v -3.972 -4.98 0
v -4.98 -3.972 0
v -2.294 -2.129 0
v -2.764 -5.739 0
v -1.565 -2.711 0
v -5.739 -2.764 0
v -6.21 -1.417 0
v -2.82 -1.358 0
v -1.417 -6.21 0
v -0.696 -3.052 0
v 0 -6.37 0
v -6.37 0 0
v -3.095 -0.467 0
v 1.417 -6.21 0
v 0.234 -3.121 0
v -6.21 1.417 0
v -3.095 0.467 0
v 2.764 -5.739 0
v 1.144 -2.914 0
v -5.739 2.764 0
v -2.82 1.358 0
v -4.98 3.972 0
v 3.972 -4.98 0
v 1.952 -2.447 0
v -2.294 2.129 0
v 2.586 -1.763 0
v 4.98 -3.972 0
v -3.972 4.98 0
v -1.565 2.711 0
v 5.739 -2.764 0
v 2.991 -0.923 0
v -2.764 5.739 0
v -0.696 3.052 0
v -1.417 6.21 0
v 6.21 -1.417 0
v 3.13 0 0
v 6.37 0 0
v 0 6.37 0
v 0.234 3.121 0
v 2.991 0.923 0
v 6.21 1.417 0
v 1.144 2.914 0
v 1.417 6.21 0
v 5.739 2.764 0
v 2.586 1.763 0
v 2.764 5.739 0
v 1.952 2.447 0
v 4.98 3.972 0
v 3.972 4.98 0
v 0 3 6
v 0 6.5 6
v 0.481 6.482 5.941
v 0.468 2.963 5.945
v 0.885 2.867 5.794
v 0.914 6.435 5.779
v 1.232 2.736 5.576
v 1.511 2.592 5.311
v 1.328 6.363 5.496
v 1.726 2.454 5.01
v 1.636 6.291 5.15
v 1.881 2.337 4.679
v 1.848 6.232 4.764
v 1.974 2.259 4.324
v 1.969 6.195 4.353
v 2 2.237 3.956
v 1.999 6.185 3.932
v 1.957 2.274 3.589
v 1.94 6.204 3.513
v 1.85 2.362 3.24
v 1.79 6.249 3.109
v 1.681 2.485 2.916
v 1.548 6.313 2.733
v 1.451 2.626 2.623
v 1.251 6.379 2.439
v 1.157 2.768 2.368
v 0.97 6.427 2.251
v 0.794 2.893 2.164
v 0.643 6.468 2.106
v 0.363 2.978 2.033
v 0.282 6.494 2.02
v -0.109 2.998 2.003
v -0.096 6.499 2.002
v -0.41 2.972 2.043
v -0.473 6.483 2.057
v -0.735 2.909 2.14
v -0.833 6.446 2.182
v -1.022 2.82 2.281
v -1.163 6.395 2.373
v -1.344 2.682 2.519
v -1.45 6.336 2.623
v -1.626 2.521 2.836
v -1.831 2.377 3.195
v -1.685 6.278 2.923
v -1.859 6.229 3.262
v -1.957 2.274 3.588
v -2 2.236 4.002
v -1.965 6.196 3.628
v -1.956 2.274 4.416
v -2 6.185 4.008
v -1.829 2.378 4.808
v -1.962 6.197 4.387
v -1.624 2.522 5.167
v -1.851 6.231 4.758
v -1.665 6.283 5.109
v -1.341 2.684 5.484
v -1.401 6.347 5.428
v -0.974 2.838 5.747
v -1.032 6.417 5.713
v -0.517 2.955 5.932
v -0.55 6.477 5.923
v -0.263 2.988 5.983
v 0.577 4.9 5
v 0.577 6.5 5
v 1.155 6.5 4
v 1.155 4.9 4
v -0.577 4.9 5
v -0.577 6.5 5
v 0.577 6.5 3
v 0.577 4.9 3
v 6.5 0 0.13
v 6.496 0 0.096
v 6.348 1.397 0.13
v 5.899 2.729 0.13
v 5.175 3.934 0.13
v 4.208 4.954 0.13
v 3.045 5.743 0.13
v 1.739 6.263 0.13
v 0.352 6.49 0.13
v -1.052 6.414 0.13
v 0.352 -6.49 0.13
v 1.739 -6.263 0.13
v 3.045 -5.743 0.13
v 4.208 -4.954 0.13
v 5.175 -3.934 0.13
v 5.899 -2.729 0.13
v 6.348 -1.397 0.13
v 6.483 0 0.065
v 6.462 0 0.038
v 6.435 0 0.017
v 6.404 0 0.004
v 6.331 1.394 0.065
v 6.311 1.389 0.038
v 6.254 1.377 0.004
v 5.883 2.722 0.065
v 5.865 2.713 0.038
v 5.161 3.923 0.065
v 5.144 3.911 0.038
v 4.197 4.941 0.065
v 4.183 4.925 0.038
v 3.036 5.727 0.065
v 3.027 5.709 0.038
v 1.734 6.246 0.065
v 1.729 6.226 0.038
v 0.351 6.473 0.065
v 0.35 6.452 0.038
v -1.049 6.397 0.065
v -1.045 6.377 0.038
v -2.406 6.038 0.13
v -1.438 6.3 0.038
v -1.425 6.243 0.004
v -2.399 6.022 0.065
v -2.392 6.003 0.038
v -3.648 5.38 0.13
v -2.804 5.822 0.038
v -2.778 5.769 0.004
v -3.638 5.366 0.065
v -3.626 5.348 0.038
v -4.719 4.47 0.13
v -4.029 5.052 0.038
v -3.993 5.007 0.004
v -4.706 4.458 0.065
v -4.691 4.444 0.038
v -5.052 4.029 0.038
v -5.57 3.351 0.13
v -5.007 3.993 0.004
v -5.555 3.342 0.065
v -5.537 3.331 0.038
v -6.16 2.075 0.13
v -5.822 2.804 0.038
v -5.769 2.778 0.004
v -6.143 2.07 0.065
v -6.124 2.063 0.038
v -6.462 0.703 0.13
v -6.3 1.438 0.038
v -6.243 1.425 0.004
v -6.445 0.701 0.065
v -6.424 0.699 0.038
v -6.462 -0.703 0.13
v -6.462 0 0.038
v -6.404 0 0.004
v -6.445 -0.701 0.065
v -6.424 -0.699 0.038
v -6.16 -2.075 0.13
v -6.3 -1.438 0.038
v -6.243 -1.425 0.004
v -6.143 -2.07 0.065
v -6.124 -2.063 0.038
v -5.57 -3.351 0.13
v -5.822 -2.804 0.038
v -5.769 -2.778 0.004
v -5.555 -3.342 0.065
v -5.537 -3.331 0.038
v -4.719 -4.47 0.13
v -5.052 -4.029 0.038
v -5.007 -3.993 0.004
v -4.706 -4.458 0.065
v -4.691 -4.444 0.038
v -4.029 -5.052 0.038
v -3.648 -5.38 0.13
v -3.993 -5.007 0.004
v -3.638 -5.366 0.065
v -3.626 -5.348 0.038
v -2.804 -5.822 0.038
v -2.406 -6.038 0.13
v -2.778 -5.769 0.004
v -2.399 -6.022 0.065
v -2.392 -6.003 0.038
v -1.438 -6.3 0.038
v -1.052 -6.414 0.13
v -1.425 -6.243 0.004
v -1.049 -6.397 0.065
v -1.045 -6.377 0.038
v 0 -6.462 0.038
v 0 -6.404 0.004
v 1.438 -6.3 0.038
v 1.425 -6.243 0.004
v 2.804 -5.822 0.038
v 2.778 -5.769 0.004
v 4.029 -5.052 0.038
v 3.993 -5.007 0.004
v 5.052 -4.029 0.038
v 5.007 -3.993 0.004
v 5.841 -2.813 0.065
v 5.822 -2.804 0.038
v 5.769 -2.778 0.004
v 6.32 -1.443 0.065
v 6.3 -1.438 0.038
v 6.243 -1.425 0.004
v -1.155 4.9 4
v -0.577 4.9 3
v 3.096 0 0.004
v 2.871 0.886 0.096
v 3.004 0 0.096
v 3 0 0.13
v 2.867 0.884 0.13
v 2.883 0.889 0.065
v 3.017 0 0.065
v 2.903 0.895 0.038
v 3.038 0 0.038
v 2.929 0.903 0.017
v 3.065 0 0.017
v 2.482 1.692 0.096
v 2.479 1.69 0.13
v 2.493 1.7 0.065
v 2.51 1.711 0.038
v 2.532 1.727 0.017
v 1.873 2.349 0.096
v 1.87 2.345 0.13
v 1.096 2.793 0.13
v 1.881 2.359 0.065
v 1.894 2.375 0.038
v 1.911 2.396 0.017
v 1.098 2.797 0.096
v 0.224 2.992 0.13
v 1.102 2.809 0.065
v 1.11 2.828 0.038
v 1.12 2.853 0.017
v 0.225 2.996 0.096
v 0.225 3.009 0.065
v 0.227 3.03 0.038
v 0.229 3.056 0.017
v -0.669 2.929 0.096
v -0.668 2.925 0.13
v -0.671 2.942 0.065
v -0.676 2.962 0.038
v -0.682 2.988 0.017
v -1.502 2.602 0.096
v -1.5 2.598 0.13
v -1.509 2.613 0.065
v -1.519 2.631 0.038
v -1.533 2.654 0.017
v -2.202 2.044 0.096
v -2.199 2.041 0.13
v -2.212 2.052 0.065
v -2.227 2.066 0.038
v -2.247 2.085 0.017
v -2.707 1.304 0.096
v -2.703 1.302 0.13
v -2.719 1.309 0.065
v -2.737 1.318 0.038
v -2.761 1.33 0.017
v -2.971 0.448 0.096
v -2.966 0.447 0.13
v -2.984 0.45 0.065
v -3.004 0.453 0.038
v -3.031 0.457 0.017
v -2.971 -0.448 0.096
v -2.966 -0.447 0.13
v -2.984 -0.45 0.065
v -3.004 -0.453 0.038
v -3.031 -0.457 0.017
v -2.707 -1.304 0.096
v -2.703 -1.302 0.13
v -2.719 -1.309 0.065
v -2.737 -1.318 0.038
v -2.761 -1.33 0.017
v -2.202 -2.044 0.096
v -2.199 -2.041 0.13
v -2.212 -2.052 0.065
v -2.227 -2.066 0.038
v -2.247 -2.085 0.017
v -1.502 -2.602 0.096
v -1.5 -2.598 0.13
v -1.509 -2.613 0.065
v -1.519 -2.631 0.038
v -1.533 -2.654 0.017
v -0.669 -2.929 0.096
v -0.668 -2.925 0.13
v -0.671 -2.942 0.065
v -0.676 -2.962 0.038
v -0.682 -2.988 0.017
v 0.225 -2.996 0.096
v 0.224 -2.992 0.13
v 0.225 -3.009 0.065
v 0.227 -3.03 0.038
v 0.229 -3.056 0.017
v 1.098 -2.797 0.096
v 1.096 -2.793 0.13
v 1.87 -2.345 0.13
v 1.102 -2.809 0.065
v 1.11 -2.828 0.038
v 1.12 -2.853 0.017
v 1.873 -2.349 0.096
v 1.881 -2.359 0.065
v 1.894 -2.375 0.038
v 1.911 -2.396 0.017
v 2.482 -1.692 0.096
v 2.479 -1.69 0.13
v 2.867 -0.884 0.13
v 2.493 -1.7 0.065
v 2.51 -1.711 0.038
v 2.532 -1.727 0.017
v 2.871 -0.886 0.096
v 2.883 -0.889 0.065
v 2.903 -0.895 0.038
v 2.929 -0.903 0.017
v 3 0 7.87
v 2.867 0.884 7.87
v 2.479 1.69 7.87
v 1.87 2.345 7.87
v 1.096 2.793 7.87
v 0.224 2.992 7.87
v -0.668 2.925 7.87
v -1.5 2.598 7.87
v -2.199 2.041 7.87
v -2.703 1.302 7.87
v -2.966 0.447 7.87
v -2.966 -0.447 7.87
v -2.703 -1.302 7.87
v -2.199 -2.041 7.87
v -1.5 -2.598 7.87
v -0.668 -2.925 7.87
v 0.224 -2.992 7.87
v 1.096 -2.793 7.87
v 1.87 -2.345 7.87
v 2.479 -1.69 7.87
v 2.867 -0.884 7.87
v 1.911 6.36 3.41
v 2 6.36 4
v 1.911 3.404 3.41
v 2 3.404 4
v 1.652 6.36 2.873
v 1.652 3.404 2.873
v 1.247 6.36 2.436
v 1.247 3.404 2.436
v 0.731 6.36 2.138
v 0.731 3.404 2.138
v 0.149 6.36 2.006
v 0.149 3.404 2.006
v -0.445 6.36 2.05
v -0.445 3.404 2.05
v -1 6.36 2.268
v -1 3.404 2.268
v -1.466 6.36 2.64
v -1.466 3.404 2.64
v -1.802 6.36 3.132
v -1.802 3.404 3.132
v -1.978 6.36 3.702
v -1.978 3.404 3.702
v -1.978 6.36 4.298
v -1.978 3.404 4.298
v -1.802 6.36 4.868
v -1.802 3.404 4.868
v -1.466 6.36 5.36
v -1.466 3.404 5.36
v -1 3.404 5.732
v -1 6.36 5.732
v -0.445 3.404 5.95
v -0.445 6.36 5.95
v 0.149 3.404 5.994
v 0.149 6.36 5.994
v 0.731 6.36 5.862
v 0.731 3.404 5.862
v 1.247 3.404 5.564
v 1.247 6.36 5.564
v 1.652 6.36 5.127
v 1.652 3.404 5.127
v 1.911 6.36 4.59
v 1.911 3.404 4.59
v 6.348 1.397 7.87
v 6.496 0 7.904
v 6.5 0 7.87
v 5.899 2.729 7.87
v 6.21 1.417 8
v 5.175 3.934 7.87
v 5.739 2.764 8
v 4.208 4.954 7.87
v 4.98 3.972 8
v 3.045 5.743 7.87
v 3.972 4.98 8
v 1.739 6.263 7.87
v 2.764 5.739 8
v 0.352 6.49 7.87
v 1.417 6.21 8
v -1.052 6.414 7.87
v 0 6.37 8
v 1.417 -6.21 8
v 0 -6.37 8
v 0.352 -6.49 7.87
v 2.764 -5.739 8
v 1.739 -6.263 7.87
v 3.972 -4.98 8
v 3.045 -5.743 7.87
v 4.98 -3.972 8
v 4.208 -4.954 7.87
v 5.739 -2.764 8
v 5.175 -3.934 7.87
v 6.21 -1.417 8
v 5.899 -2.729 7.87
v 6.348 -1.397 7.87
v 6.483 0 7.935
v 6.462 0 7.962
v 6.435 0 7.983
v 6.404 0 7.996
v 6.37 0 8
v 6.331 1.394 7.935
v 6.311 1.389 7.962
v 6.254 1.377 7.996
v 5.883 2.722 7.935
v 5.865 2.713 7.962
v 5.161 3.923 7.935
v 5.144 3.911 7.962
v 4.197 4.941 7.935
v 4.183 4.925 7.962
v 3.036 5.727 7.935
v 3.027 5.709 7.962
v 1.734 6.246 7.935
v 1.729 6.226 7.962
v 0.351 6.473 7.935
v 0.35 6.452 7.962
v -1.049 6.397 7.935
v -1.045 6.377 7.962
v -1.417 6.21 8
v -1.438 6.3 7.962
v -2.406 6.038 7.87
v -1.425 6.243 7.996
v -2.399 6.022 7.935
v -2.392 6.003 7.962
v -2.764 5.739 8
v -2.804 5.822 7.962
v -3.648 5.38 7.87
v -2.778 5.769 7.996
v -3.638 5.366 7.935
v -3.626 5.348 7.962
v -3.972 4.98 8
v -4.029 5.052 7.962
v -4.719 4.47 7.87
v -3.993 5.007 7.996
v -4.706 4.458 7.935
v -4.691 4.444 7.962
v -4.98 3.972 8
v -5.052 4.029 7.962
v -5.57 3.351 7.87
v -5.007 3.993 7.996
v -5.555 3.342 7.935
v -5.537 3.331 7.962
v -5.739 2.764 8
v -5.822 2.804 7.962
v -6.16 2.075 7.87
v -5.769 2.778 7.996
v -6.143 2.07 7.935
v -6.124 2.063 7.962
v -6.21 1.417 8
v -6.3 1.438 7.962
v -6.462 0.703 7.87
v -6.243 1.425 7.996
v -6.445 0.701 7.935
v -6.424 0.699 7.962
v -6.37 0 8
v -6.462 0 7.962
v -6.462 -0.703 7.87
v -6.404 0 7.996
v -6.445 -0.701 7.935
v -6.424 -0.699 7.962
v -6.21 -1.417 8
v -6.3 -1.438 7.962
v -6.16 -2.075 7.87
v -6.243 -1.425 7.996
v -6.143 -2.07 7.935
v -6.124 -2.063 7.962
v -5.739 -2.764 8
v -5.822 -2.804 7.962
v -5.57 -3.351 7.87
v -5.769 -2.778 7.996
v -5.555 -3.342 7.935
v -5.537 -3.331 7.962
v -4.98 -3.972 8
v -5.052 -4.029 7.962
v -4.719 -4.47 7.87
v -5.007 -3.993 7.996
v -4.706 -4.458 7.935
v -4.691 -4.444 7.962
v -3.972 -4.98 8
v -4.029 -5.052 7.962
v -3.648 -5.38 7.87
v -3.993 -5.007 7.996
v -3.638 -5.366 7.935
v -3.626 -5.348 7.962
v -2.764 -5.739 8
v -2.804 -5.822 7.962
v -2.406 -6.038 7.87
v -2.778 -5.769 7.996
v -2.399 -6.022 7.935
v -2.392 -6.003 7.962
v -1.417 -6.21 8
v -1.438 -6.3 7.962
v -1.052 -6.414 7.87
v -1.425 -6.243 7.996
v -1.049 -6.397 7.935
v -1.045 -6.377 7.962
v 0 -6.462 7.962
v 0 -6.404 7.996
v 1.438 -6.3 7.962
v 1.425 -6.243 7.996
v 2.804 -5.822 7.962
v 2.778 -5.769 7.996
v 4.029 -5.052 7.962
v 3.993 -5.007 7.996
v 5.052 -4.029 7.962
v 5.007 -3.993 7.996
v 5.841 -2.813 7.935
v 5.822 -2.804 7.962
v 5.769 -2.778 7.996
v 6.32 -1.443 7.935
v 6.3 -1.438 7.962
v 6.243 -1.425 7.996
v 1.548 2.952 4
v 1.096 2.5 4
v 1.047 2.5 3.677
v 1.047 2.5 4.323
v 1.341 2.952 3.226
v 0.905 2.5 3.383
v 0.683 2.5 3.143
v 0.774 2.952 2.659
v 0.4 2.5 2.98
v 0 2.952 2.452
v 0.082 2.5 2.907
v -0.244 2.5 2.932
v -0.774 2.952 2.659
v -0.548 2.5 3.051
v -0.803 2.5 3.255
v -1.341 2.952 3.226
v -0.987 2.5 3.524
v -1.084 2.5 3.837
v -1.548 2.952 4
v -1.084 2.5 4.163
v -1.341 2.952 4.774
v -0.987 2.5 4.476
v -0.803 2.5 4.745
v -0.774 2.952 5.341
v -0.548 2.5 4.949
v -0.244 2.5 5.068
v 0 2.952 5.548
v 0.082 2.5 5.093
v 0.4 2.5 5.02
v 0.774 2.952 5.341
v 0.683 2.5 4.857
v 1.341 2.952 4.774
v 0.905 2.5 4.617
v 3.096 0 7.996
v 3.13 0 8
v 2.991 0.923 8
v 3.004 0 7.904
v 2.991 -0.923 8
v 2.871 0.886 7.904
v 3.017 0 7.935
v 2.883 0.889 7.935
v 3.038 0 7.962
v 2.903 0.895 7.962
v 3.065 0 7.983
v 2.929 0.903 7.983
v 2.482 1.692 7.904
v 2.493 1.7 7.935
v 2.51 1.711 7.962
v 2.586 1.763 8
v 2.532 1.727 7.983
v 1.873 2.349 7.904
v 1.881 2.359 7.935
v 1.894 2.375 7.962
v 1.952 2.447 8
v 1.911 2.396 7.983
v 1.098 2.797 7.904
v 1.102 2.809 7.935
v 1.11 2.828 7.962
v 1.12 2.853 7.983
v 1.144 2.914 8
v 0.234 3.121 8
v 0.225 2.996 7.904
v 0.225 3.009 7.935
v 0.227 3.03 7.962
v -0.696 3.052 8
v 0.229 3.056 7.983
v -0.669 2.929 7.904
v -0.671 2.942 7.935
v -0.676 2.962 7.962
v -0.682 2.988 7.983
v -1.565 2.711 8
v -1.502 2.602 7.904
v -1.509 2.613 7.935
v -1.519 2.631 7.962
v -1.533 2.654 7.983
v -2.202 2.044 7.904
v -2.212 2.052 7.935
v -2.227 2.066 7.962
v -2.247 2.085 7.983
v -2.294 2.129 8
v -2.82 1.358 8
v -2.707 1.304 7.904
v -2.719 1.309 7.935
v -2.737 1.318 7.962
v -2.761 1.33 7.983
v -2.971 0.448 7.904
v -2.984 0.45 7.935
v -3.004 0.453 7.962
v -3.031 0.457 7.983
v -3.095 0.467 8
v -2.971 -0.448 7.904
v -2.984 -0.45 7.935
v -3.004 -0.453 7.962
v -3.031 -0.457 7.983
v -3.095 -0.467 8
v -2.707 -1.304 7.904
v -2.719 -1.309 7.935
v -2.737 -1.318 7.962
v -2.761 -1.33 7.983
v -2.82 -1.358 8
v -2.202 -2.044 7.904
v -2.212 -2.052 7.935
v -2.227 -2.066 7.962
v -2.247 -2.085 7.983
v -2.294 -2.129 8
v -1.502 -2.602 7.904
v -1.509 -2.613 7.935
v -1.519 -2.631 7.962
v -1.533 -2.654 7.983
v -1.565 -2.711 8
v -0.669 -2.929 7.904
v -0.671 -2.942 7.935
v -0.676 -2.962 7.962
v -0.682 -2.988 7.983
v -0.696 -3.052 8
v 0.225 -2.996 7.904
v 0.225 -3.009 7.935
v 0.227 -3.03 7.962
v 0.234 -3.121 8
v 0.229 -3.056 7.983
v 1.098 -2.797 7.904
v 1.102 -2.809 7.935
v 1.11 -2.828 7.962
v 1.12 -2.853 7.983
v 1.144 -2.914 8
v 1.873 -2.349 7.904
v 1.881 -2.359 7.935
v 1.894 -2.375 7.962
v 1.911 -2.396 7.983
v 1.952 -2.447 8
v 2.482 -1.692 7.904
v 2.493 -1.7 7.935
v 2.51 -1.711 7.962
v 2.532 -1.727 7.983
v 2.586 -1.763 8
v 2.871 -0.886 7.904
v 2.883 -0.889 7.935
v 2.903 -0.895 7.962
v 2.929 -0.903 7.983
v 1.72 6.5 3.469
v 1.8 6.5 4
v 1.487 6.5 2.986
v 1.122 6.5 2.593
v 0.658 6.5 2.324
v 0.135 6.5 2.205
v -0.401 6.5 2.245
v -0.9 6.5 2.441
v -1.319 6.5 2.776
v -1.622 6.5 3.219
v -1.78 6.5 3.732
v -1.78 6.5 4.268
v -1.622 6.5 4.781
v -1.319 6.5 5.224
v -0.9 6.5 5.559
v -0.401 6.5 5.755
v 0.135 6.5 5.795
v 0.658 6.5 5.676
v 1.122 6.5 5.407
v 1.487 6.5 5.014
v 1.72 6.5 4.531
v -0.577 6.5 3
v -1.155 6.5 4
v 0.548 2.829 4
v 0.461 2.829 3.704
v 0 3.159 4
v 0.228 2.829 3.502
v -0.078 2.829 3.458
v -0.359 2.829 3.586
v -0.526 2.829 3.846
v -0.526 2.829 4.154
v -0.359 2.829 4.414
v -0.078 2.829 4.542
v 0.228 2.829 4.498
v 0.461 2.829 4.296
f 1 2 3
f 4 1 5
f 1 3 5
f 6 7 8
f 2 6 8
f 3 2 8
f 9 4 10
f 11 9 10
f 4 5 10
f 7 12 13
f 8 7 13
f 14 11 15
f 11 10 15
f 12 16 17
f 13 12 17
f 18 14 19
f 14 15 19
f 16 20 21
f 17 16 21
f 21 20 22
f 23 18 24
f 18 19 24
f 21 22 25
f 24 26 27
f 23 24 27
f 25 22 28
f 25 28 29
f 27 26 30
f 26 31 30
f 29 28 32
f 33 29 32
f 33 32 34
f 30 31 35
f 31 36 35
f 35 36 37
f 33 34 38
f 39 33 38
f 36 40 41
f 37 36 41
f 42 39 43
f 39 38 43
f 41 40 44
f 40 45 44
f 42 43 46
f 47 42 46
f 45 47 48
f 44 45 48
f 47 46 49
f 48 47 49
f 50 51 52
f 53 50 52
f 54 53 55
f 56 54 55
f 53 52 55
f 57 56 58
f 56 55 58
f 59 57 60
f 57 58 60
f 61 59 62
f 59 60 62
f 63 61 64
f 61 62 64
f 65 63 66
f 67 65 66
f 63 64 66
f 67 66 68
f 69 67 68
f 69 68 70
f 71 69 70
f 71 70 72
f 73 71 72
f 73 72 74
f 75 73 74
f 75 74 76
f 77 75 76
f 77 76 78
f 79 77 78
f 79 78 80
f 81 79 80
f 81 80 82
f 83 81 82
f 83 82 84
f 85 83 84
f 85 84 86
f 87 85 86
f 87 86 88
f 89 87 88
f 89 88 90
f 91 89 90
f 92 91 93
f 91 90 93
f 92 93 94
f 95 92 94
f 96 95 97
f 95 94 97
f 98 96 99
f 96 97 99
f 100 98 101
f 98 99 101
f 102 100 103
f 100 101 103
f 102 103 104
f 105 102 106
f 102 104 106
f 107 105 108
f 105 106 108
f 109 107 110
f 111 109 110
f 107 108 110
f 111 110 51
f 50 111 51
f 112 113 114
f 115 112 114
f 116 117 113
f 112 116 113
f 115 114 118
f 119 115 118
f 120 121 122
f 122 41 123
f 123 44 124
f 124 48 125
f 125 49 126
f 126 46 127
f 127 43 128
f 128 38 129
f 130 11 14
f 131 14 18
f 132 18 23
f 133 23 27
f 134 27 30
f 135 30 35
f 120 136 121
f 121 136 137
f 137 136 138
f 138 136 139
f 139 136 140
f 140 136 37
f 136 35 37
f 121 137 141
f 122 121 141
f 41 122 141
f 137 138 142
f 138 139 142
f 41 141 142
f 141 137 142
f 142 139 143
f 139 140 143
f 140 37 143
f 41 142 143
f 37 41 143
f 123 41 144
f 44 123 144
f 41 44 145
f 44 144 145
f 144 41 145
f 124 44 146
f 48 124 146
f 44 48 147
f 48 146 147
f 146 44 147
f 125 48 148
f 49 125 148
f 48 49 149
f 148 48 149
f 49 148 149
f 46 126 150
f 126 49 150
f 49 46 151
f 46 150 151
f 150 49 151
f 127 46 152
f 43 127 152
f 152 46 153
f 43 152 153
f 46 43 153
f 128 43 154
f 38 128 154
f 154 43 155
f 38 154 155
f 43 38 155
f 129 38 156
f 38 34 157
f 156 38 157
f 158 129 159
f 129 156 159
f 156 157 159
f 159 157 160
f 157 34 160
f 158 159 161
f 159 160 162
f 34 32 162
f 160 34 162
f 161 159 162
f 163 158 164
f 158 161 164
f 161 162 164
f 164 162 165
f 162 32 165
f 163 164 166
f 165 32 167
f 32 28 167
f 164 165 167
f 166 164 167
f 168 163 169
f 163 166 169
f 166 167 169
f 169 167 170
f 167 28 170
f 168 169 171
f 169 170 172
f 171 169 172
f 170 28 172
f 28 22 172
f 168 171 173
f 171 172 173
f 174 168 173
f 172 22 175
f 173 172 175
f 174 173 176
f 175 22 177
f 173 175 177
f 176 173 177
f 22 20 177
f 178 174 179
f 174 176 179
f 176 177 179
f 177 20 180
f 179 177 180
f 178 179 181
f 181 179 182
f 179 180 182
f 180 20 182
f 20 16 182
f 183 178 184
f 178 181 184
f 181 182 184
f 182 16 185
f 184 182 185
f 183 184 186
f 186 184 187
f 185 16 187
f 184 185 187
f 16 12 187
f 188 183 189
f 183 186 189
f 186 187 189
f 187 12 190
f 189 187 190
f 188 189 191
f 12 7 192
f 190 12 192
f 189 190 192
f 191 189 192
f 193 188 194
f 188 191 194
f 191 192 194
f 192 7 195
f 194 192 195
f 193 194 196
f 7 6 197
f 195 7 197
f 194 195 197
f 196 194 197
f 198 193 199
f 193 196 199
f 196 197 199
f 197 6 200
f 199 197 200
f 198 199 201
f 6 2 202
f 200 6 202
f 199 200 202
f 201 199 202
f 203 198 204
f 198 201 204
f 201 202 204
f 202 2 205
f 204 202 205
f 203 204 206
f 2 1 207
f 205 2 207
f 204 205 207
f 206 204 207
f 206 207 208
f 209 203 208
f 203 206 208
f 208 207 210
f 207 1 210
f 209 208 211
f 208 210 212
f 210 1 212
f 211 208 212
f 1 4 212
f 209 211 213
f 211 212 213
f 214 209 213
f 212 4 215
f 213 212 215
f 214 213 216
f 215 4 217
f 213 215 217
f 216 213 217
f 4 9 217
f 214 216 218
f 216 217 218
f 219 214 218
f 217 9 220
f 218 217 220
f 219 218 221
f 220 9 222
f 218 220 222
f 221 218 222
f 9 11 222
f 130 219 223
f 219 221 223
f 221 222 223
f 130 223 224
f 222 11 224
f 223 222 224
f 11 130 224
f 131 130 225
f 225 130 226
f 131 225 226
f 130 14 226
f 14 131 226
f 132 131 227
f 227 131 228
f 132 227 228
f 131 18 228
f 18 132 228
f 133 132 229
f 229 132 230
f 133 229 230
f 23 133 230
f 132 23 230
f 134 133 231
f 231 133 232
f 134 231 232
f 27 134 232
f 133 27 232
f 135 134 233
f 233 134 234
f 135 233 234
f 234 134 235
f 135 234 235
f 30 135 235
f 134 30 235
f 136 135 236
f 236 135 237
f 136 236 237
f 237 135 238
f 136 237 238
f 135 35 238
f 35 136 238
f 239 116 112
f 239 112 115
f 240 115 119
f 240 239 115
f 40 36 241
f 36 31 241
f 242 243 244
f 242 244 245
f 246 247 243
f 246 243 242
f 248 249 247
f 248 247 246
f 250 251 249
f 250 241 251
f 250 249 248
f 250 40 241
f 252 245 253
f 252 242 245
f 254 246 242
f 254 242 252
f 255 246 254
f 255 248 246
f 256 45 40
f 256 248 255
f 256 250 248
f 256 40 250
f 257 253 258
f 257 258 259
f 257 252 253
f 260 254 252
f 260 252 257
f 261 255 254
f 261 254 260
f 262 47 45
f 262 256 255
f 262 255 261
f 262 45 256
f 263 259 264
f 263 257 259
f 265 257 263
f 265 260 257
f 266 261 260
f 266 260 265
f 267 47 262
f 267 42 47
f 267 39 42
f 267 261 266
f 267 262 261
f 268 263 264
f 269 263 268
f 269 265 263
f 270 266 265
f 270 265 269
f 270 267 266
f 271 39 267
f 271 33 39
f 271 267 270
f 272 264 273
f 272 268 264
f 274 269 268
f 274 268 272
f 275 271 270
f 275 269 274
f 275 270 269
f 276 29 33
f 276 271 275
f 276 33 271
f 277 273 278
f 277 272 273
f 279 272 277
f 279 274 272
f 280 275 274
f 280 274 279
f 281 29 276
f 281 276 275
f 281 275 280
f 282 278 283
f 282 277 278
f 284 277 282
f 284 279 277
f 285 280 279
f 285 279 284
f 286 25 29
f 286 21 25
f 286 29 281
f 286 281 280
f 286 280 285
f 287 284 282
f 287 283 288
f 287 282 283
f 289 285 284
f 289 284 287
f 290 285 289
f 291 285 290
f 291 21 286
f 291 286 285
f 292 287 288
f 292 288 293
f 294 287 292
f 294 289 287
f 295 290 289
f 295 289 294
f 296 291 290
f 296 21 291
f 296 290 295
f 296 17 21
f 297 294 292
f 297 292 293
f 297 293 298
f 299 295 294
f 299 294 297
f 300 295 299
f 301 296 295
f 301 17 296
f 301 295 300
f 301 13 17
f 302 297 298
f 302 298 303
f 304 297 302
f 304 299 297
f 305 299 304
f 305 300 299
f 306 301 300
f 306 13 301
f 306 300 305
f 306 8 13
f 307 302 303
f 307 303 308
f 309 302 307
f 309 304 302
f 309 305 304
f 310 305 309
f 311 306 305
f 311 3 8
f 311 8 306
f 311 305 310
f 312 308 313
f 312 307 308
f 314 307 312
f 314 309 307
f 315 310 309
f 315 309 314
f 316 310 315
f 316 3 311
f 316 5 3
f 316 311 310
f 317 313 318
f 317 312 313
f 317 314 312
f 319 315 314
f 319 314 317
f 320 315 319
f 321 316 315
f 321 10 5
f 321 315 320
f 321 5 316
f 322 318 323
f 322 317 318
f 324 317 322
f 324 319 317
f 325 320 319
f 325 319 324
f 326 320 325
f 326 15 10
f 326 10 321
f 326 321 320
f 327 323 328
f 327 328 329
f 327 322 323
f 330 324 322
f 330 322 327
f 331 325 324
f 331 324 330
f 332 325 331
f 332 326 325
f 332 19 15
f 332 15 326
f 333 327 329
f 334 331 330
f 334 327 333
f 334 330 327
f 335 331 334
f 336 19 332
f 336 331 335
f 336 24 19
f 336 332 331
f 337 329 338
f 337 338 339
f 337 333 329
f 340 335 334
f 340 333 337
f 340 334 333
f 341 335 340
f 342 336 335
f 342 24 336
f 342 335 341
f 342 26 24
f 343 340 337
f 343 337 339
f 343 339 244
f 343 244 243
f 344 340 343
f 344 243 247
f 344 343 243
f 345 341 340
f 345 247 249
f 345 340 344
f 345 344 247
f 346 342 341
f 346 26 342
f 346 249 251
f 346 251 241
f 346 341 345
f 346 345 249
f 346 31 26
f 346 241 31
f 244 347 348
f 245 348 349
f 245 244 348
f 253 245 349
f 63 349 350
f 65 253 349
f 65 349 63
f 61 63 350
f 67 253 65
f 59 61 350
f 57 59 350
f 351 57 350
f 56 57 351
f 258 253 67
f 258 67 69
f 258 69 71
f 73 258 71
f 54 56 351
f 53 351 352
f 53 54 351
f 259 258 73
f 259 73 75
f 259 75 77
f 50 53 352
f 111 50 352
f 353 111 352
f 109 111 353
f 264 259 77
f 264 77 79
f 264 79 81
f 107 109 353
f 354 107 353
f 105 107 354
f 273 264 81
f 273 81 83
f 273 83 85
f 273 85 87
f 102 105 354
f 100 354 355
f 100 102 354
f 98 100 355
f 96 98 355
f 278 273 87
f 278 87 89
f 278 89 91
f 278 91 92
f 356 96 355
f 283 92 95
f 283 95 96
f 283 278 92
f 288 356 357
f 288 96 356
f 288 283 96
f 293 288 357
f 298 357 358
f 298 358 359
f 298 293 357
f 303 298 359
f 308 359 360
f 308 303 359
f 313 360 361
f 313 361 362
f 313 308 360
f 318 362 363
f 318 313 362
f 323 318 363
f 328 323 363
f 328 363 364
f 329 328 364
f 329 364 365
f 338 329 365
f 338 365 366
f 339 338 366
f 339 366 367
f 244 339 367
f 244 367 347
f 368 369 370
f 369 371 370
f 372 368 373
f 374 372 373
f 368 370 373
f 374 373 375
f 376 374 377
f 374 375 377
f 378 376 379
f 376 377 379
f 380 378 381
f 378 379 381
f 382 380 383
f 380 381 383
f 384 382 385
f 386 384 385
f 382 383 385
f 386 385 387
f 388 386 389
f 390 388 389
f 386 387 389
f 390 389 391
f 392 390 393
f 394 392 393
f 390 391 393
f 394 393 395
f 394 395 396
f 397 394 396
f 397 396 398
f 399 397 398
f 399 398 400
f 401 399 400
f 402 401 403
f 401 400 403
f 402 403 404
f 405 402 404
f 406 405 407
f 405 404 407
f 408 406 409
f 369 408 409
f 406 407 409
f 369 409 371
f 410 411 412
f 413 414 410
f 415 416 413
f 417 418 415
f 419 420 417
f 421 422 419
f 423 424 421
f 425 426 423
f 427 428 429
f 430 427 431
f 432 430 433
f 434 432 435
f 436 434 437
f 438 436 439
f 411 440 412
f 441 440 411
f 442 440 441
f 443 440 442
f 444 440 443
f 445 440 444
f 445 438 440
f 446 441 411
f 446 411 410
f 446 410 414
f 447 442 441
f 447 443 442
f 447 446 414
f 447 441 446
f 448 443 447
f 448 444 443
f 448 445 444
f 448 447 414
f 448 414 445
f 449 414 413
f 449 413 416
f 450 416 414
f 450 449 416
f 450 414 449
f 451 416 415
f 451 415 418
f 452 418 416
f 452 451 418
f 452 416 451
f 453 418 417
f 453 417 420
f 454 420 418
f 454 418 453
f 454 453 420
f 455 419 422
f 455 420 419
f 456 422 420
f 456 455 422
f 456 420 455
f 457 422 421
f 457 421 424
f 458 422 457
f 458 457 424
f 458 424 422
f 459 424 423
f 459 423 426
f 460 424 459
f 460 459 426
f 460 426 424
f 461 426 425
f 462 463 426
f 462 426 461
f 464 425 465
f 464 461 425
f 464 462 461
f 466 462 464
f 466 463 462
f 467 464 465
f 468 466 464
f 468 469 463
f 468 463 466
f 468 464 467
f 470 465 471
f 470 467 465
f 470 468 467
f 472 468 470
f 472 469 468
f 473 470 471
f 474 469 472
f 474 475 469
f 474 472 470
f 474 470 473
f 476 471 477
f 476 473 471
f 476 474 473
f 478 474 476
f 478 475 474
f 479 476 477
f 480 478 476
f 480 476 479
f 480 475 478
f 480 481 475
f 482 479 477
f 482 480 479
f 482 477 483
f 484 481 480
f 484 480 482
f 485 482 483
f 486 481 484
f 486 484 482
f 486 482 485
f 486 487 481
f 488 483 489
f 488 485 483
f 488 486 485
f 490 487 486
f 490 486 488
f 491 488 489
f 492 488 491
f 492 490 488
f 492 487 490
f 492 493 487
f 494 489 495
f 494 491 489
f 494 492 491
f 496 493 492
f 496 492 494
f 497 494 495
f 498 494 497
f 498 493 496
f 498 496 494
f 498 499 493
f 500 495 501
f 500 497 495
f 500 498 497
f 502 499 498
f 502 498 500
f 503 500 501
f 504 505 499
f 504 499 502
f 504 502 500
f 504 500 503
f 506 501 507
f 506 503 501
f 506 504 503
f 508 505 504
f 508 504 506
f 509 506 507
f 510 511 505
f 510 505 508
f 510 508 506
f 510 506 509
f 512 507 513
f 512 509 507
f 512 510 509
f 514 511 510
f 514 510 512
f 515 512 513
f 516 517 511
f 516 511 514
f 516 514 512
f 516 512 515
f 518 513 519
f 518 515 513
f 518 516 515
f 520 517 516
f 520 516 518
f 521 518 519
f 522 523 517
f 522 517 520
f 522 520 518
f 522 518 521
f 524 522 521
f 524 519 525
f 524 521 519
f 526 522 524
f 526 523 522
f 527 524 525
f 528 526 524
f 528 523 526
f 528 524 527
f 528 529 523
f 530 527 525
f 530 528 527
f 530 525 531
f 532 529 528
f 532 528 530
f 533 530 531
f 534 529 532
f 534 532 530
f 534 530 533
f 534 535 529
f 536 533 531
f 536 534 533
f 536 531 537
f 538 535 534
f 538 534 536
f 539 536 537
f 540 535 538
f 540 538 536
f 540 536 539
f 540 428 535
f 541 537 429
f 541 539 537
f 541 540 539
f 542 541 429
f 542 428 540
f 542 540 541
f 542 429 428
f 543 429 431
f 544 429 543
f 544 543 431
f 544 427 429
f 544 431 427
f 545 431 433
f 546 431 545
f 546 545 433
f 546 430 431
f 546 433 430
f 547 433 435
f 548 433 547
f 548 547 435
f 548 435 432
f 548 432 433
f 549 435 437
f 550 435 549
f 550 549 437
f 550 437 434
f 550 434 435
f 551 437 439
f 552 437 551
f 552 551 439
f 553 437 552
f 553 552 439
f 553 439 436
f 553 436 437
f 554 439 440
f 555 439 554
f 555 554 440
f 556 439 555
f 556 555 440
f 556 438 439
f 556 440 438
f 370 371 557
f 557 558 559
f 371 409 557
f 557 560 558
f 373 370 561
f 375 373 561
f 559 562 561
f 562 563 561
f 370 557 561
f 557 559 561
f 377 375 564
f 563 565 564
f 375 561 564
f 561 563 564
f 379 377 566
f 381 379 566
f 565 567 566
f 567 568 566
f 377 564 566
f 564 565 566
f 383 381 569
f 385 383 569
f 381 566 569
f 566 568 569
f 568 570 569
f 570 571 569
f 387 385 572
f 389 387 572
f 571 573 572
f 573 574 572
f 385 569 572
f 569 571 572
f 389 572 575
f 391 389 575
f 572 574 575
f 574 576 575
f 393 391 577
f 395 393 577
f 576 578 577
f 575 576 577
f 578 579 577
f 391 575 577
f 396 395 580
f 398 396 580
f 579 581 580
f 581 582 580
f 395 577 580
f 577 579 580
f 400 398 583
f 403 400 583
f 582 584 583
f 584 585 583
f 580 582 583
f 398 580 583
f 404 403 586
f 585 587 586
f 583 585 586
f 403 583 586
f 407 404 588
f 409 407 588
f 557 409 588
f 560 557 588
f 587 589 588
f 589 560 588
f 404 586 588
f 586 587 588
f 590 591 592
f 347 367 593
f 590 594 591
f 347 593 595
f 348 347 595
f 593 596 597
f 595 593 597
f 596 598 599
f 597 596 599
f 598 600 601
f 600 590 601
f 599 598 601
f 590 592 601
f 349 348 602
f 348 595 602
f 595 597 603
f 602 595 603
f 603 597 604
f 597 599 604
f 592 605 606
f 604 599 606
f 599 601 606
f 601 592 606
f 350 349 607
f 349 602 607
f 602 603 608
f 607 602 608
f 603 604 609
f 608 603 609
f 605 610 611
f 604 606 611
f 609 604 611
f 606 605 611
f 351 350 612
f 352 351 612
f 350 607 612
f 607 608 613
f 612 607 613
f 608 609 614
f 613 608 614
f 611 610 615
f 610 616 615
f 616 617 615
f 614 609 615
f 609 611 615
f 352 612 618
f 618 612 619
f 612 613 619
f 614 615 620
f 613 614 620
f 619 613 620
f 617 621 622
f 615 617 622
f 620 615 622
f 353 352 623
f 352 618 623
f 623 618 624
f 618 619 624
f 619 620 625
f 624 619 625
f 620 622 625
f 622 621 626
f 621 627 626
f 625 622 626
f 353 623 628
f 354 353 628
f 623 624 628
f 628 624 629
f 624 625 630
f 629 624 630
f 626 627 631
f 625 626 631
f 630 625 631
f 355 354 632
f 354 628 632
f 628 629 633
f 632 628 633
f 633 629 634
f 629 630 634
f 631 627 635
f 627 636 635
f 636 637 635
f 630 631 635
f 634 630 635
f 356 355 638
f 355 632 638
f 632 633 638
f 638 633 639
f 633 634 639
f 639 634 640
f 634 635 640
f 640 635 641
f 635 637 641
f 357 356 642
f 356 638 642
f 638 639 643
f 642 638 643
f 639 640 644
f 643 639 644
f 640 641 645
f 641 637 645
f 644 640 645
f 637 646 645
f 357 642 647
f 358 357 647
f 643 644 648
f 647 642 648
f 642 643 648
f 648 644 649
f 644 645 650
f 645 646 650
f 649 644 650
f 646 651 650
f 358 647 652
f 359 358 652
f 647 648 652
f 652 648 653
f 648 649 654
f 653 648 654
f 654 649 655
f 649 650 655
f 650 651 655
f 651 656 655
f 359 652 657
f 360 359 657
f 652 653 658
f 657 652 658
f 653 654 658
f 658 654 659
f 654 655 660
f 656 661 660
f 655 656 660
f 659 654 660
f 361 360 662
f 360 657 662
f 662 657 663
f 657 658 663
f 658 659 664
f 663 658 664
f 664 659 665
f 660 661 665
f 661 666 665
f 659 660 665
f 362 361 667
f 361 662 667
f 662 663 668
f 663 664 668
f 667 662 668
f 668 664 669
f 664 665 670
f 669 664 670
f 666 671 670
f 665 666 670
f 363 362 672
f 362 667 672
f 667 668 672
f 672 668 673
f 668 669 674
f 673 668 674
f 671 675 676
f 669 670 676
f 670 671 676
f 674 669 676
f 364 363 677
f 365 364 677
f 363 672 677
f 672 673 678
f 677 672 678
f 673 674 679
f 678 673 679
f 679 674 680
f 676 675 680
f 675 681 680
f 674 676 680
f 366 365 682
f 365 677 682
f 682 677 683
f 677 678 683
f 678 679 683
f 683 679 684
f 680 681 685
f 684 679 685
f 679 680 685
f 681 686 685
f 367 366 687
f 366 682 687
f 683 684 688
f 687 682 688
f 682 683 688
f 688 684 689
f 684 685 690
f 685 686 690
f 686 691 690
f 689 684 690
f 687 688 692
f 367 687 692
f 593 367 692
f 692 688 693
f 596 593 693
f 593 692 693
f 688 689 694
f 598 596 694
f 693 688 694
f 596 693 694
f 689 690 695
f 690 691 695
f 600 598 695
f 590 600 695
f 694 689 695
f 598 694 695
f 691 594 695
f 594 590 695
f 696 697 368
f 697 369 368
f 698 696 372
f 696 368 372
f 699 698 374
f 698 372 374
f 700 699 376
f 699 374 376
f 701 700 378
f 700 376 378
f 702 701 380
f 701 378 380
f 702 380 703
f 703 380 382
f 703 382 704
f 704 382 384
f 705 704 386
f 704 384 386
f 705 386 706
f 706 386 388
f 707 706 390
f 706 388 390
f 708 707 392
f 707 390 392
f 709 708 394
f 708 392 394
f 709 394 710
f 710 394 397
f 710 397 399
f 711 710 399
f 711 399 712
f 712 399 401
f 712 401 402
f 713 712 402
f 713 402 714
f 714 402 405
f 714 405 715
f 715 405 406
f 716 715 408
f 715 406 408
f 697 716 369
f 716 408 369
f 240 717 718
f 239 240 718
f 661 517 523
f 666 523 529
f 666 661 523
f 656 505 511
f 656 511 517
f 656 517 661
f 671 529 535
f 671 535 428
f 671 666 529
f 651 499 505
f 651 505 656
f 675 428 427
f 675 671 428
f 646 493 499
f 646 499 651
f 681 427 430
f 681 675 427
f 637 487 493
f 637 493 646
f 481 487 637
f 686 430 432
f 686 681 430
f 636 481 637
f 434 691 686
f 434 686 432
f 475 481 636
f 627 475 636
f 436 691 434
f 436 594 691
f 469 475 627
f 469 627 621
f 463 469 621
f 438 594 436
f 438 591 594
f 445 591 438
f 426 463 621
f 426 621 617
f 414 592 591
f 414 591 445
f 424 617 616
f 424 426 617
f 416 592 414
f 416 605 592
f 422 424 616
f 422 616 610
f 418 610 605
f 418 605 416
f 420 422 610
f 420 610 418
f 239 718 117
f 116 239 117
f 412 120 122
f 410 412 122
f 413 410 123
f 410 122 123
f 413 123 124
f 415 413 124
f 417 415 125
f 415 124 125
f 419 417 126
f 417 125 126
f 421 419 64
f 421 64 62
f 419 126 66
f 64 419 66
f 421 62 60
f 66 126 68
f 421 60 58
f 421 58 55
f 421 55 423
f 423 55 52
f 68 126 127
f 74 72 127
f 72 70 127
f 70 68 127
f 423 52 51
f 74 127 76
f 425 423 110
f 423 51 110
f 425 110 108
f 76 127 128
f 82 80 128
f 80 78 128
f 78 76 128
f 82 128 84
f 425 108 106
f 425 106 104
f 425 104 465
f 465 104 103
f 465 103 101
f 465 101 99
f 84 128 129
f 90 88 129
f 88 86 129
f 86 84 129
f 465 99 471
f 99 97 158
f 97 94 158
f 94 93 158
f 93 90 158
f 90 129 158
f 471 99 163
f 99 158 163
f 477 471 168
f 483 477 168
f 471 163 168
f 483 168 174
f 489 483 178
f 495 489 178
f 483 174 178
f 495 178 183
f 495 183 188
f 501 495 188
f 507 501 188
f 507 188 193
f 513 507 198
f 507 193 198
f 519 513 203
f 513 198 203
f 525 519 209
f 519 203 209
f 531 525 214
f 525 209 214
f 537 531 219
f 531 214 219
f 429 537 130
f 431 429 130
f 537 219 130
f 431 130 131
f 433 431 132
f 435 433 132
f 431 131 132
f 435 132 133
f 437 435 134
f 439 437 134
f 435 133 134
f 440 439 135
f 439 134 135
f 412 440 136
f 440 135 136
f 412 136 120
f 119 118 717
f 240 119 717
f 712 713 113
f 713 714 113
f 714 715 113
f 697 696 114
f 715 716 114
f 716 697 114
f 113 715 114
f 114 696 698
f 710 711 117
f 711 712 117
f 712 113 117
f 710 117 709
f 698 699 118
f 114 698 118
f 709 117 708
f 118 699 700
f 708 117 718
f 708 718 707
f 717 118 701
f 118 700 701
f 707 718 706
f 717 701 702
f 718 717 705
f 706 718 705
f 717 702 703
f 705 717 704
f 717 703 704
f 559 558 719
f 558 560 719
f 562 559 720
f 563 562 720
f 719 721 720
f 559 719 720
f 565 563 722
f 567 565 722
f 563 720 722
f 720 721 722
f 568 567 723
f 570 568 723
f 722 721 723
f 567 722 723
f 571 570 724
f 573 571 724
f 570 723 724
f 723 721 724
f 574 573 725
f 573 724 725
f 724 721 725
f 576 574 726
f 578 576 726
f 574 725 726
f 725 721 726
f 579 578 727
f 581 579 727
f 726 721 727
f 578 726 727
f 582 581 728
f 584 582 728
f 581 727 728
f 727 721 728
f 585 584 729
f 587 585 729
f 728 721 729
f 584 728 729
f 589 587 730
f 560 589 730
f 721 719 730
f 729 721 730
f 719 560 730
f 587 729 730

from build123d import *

# Parameters (mm, degrees)
SKETCH1_R               = 6.5
SKETCH1_R_2             = 3
EXTRUDE1_DEPTH          = 8
CUT_EXTRUDE1_REACH      = 18.591
CUT_EXTRUDE1_END_RADIUS = 3
SKETCH2_R               = 2
CUT_EXTRUDE2_DEPTH      = 1.6
FILLET1_R               = 0.13


with BuildPart() as part:
    # Sketch1 → Extrude1 (new body)
    with BuildSketch(Plane.XY):
        Circle(SKETCH1_R)
        Circle(SKETCH1_R_2, mode=Mode.SUBTRACT)
    extrude(amount=EXTRUDE1_DEPTH)

    # Cut-Extrude1: up to this cylinder (the profile starts outside it)
    cut_extrude1_end = Plane(origin=(0, 0, 4), z_dir=(0, 0, -1)) * Cylinder(CUT_EXTRUDE1_END_RADIUS, 44.182, mode=Mode.PRIVATE)
    # Sketch2 → Cut-Extrude1 (cut, up to the surface)
    with BuildSketch(Plane(origin=(0, 6.5, 0), x_dir=(-1, 0, 0), z_dir=(0, 1, 0)), mode=Mode.PRIVATE) as cut_extrude1_sk1:
        with Locations(Location((0, 4, 0), (0, 0, 90))):
            Circle(SKETCH2_R)
    cut_extrude1_tool1 = extrude(cut_extrude1_sk1.sketch, amount=-CUT_EXTRUDE1_REACH, mode=Mode.PRIVATE) - cut_extrude1_end
    add(cut_extrude1_tool1.solids().sort_by_distance((0, 6.5, 4))[0], mode=Mode.SUBTRACT)

    # Fillet1
    fillet1_edges = [part.edges().sort_by_distance(p)[0] for p in [
        (-6.5, 0, 0),
        (-6.5, 0, 8),
        (-3, 0, 0),
        (-3, 0, 8),
    ]]
    fillet(fillet1_edges, radius=FILLET1_R)


with BuildPart() as body_2:
    # Sketch3 → Revolve1 (revolve)
    with BuildSketch(Plane.XY.offset(4), mode=Mode.PRIVATE) as revolve1_sk:
        Polygon((-1.8, 6.5), (-2, 6.359958492), (-2, 3.404070187), (-1.095929813, 2.5), (0, 3.158501066), (0, 6.5), align=None)
    revolve(revolve1_sk.sketch.rotate(Axis((0, 3.158501066, 4), (0, 1, 0)), 180), axis=Axis((0, 3.158501066, 4), (0, 1, 0)))

    # Sketch4 → Cut-Extrude2 (cut)
    with BuildSketch(Plane(origin=(0, 6.5, 0), x_dir=(0, 0, -1), z_dir=(0, 1, 0))):
        Polygon((-4, 1.154700538), (-5, 0.577350269), (-5, -0.577350269), (-4, -1.154700538), (-3, -0.577350269), (-3, 0.577350269), align=None)
    extrude(amount=-CUT_EXTRUDE2_DEPTH, mode=Mode.SUBTRACT)


solid = Compound([part.part, body_2.part])
